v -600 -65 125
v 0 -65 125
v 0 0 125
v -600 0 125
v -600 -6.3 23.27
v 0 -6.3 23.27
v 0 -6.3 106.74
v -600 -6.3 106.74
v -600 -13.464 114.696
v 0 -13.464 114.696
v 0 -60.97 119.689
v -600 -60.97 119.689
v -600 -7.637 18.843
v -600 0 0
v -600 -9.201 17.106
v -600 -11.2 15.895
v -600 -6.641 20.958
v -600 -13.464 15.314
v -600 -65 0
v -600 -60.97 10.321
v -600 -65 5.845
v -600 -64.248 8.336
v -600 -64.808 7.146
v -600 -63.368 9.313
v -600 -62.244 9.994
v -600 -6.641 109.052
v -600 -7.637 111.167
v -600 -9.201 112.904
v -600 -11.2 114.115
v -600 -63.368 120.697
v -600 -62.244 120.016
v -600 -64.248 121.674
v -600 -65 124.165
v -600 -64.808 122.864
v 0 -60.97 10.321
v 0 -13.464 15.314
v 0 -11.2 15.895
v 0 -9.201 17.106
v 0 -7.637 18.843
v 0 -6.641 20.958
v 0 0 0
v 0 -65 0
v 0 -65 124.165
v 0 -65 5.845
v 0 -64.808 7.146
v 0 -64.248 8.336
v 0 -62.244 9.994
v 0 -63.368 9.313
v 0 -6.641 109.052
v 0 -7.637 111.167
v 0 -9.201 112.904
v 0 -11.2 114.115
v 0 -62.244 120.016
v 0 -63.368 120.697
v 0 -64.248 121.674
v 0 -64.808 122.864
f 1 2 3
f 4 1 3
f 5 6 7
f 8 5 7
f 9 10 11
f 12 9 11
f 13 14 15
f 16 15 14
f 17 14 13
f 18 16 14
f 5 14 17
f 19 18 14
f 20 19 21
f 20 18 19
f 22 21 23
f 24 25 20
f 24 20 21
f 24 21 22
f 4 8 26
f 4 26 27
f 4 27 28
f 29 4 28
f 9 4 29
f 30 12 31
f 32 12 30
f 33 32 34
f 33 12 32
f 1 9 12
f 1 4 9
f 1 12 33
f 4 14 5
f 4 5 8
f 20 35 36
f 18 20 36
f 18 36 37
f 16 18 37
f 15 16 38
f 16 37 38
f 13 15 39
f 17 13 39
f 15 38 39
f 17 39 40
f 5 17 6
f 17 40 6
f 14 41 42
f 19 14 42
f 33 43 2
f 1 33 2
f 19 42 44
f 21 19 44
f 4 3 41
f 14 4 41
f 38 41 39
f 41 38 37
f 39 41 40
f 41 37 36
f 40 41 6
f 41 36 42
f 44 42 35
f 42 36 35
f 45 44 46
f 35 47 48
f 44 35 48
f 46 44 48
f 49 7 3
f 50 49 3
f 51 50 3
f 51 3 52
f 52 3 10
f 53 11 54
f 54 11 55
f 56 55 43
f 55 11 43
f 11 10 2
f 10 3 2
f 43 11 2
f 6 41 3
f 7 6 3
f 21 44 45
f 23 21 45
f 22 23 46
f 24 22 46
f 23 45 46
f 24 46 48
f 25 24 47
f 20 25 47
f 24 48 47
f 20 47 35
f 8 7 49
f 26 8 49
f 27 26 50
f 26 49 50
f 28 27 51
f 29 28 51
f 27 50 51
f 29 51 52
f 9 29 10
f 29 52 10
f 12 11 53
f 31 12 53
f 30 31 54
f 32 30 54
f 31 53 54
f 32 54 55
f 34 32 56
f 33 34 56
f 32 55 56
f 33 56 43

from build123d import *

# Parameters (mm, degrees)
C_CHANNEL_120_X_12_1_DEPTH = 600


with BuildPart() as part:
    # Sketch11 → C channel 120 X 12(1) (new body)
    with BuildSketch(Plane(origin=(0, 0, 0), x_dir=(0, -1, 0), z_dir=(-1, 0, 0))):
        with BuildLine():
            Line((65, 125), (0, 125))
            Line((0, 125), (0, 0))
            Line((0, 0), (65, 0))
            Line((65, 0), (65, 5.845330836))
            ThreePointArc((65, 5.845330836), (63.844151715, 8.856418565), (60.970378085, 10.320679365))
            Line((60.970378085, 10.320679365), (13.463772294, 15.313824837))
            ThreePointArc((13.463772294, 15.313824837), (8.354841396, 17.916955149), (6.3, 23.27))
            Line((6.3, 23.27), (6.3, 106.74))
            ThreePointArc((6.3, 106.74), (8.354841396, 112.093044851), (13.463772294, 114.696175163))
            Line((13.463772294, 114.696175163), (60.970378085, 119.689320635))
            ThreePointArc((60.970378085, 119.689320635), (63.844151715, 121.153581435), (65, 124.164669164))
            Line((65, 124.164669164), (65, 125))
        make_face()
    extrude(amount=C_CHANNEL_120_X_12_1_DEPTH)


solid = part.part
